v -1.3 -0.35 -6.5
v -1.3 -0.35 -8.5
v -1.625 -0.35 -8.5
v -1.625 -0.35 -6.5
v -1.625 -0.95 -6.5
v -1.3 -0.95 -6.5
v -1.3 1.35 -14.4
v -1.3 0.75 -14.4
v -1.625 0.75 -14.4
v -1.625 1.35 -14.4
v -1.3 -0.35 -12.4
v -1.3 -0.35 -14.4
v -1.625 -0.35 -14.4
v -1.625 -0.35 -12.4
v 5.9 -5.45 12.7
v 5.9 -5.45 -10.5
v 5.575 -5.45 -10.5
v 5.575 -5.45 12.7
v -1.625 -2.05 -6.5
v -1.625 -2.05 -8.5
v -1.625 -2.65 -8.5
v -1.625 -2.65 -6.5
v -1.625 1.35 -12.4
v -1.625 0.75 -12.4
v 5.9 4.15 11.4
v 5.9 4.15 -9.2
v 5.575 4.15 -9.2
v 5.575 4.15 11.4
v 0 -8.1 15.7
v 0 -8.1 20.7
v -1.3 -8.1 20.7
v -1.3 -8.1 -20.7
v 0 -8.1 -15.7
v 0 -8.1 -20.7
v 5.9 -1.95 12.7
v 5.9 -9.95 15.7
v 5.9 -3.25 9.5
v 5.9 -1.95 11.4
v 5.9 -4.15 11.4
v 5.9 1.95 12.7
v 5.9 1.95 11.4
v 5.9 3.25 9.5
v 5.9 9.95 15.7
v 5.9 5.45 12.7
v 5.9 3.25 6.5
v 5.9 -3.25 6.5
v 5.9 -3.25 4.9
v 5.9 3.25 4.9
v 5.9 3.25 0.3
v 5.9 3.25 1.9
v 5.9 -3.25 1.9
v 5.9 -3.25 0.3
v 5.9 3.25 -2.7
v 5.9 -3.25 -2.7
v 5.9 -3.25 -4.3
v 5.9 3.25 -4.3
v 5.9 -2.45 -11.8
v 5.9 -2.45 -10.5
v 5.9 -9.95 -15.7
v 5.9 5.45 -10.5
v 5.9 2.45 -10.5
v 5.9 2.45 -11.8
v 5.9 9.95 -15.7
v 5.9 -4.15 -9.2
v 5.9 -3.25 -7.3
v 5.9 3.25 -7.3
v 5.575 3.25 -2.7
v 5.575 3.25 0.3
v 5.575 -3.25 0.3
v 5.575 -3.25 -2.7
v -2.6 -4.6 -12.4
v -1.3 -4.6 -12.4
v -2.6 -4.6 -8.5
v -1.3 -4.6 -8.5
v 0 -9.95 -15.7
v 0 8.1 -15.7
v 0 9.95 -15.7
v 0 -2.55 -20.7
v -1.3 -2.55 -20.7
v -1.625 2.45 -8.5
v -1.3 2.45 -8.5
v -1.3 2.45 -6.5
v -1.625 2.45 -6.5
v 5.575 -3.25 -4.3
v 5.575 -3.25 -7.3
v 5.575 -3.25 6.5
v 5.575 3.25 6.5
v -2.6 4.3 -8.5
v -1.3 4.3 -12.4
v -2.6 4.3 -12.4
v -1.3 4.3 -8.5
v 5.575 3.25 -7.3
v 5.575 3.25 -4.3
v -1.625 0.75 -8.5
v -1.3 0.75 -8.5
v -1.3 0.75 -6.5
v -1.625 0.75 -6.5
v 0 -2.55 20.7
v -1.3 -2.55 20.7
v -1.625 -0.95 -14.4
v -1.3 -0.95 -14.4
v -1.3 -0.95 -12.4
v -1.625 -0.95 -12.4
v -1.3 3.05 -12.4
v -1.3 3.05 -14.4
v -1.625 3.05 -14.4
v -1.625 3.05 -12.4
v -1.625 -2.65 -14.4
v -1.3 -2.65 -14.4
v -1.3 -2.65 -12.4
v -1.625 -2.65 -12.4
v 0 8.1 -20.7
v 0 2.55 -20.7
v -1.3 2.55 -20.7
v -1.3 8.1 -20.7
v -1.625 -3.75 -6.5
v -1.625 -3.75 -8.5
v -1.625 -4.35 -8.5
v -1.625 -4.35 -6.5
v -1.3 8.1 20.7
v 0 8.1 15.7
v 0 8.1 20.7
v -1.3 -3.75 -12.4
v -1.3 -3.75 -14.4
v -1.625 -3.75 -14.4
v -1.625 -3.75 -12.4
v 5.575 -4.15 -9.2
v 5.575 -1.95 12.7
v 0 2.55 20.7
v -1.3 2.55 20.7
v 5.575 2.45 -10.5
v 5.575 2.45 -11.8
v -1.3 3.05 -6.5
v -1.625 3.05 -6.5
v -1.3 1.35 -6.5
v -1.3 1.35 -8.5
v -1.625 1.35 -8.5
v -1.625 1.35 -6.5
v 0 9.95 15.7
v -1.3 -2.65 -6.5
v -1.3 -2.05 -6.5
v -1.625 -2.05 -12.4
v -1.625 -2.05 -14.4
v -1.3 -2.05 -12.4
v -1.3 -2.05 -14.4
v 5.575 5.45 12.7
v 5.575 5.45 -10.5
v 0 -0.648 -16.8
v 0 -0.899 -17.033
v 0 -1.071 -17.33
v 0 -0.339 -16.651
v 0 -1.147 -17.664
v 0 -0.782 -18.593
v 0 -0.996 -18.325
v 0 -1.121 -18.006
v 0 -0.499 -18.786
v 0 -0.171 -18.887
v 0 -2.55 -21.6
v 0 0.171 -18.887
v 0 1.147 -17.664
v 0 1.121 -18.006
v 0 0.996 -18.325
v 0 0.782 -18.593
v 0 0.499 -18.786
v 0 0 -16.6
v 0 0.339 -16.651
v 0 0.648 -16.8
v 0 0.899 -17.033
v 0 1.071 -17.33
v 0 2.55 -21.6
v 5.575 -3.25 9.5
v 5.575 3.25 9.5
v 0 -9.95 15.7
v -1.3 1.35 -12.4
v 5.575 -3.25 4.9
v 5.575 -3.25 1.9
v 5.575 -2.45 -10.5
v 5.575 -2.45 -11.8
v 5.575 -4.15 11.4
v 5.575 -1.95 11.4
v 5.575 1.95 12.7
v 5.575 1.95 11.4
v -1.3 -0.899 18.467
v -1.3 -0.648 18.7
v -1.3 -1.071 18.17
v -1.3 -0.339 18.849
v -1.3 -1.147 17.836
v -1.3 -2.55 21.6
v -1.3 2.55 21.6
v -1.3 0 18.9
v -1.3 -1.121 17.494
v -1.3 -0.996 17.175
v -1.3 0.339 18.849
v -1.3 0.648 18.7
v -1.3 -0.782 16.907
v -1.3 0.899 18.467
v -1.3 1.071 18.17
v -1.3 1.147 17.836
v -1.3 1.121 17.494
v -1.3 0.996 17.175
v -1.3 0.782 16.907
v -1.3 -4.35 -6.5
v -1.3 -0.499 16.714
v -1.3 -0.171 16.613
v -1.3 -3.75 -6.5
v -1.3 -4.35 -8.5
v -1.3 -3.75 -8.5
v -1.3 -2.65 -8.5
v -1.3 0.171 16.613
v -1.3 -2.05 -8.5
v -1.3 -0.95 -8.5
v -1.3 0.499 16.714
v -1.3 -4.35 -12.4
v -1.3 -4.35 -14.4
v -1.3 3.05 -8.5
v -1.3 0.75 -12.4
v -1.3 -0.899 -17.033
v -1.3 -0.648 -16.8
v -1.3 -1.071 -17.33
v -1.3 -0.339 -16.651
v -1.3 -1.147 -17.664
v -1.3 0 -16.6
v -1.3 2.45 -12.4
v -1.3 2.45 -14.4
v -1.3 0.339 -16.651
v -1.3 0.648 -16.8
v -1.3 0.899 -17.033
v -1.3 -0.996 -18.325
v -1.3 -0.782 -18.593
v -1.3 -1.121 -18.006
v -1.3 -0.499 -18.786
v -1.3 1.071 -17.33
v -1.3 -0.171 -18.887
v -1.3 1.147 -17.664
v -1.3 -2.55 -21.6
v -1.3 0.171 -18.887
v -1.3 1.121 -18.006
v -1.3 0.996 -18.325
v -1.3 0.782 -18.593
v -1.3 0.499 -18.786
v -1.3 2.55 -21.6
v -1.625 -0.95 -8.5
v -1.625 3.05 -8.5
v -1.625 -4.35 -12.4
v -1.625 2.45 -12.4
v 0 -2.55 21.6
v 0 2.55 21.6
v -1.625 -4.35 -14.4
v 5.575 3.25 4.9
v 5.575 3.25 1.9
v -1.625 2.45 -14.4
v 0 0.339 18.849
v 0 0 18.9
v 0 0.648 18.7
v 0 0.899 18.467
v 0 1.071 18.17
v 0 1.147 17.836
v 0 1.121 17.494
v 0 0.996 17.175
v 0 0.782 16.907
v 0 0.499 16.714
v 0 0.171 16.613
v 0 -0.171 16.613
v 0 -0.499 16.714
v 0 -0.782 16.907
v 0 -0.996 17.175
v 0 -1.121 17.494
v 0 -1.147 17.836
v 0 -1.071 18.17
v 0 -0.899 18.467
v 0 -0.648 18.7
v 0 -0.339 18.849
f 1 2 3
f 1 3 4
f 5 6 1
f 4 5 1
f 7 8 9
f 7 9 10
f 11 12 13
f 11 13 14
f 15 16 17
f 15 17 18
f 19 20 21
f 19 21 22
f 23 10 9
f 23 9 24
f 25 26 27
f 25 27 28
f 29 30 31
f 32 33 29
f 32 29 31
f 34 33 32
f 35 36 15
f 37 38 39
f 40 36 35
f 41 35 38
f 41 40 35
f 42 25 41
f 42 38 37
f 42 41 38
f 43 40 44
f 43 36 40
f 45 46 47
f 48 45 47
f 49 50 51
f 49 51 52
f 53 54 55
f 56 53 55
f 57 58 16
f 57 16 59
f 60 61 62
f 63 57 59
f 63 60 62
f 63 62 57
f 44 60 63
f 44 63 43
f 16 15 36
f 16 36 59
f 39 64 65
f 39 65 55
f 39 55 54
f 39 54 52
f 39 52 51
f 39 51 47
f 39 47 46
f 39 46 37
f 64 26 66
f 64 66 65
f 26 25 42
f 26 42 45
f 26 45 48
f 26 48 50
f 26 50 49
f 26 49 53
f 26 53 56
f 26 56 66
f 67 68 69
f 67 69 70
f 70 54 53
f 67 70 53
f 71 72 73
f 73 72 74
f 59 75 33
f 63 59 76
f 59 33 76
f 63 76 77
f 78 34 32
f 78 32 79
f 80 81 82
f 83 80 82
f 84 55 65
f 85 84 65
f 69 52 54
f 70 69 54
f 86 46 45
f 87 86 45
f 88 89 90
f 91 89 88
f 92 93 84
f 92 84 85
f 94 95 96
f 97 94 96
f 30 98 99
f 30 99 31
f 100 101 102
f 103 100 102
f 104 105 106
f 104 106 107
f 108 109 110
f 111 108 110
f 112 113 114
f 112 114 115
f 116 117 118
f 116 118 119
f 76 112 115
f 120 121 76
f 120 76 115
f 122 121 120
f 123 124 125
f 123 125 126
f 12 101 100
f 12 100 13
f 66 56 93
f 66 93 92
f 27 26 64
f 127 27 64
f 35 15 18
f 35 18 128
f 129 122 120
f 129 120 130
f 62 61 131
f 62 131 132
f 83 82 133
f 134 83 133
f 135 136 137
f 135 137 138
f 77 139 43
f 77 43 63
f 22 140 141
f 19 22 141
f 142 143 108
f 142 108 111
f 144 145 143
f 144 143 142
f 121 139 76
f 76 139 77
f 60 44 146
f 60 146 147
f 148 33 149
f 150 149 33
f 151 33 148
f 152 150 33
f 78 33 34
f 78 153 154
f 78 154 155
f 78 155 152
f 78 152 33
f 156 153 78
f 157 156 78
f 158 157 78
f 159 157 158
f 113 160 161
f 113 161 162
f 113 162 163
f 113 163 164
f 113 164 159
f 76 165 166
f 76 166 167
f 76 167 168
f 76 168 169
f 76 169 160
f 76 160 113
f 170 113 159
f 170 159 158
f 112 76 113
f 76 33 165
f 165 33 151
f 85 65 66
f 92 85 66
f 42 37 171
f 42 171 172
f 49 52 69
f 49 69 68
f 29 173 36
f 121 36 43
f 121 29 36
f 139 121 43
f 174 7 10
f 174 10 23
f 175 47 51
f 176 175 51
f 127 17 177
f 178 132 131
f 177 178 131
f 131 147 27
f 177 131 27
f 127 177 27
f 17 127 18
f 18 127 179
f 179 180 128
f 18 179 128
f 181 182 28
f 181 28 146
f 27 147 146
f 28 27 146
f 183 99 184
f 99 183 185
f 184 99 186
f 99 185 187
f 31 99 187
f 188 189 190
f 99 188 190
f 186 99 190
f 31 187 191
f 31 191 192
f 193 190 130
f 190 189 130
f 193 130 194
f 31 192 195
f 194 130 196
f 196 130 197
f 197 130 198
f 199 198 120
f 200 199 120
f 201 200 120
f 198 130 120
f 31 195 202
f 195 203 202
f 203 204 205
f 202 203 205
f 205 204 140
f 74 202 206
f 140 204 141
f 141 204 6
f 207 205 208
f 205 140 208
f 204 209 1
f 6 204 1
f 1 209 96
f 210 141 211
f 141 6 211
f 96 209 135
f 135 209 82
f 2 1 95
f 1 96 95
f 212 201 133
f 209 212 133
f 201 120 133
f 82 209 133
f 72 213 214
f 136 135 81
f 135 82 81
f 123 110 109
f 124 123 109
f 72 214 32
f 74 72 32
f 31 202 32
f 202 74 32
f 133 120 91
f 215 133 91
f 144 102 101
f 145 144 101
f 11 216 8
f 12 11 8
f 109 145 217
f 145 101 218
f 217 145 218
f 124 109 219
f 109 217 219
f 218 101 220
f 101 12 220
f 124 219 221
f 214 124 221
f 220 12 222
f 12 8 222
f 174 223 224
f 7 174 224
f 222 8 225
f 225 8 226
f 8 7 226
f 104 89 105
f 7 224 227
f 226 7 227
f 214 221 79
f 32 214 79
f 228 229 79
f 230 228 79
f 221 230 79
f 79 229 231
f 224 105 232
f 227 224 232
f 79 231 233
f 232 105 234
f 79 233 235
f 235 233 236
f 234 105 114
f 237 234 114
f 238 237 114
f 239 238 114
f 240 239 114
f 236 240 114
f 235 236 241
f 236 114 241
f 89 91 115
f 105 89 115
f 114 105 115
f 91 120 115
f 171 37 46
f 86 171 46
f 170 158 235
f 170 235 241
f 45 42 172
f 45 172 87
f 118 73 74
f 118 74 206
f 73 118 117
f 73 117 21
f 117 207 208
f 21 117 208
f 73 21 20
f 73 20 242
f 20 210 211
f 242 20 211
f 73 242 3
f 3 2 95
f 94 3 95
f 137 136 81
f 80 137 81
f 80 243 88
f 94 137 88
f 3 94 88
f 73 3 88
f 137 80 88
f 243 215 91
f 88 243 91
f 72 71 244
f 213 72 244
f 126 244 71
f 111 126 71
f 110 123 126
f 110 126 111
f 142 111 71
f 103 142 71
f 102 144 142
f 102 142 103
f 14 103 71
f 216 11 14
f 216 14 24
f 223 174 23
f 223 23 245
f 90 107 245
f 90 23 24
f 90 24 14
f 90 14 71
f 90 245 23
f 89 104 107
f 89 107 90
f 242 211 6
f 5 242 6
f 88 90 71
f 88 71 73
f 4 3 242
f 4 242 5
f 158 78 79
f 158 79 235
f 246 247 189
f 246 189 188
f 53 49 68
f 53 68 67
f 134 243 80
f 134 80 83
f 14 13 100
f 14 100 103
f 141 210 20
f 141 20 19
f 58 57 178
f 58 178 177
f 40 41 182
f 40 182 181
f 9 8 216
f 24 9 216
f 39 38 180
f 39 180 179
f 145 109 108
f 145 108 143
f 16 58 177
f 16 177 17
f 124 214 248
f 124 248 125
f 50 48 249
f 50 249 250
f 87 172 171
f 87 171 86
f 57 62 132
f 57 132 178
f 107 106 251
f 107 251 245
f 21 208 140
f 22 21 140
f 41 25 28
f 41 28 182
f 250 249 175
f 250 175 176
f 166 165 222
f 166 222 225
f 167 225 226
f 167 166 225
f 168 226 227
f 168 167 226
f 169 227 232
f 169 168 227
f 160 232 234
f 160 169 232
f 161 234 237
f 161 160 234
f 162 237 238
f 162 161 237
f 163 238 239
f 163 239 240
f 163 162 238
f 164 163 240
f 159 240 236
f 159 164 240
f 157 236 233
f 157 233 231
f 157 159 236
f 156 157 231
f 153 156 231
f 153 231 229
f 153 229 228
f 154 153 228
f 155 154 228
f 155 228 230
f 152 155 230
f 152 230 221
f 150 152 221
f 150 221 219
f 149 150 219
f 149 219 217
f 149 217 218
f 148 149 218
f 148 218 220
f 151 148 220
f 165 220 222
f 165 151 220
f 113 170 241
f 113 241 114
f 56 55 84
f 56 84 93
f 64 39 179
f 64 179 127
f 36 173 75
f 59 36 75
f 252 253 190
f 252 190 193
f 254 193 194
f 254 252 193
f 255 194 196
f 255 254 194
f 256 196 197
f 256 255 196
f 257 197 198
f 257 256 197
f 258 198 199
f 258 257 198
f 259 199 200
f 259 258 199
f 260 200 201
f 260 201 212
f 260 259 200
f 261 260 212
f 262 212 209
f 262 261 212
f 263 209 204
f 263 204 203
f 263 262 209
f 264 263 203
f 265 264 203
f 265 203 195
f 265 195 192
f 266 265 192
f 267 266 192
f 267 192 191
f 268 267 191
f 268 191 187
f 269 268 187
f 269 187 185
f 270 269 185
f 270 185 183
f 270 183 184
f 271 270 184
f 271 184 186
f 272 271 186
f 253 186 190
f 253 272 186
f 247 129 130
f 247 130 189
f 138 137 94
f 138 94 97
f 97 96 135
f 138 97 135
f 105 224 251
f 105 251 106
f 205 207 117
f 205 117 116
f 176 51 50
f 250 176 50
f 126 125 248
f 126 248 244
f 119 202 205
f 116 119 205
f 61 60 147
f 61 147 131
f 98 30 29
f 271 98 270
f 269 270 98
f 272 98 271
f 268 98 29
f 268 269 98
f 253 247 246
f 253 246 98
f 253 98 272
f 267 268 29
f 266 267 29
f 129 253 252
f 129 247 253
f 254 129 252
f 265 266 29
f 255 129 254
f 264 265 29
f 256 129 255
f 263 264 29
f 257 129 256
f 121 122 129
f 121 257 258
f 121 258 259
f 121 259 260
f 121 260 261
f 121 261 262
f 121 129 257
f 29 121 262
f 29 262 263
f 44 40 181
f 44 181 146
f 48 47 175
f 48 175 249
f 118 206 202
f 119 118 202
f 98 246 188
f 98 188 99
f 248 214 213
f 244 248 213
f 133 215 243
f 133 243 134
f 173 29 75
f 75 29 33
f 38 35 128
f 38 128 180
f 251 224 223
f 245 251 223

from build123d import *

# Parameters (mm, degrees)
CROQUIS1_W              = 31.4
CROQUIS1_H              = 19.9
SALIENTE_EXTRUIR1_DEPTH = 5.9
CROQUIS2_R              = 1.15
SALIENTE_EXTRUIR2_DEPTH = 1.3
CROQUIS3_W              = 3.9
CROQUIS3_H              = 8.9
SALIENTE_EXTRUIR3_DEPTH = 1.3
CROQUIS4_W              = 2
CROQUIS4_H              = 0.6
SALIENTE_EXTRUIR4_DEPTH = 0.325
MATRIZL1_COUNT          = 2
MATRIZL1_PITCH          = 5.9
MATRIZL1_COUNT_DIR2     = 5
MATRIZL1_PITCH_DIR2     = 1.7
CROQUIS5_W              = 3
CROQUIS5_H              = 6.5
CORTAR_EXTRUIR1_DEPTH   = 0.325


with BuildPart() as part:
    # Croquis1 → Saliente-Extruir1 (new body)
    with BuildSketch(Plane(origin=(0, 0, 0), x_dir=(0, 0, -1), z_dir=(1, 0, 0))):
        Rectangle(CROQUIS1_W, CROQUIS1_H)
    extrude(amount=SALIENTE_EXTRUIR1_DEPTH)

    # Croquis2 → Saliente-Extruir2 (add)
    with BuildSketch(Plane.ZY):
        Polygon((21.6, 2.55), (21.6, -2.55), (20.7, -2.55), (20.7, -8.1), (-20.7, -8.1), (-20.7, -2.55), (-21.6, -2.55), (-21.6, 2.55), (-20.7, 2.55), (-20.7, 8.1), (20.7, 8.1), (20.7, 2.55), align=None)
        with Locations((-17.75, 0)):
            Circle(CROQUIS2_R, mode=Mode.SUBTRACT)
        with Locations((17.75, 0)):
            Circle(CROQUIS2_R, mode=Mode.SUBTRACT)
    extrude(amount=SALIENTE_EXTRUIR2_DEPTH)

    # Croquis3 → Saliente-Extruir3 (add)
    with BuildSketch(Plane.ZY.offset(1.3)):
        with Locations((-10.45, -0.15)):
            Rectangle(CROQUIS3_W, CROQUIS3_H)
    extrude(amount=SALIENTE_EXTRUIR3_DEPTH)

    # Croquis4 → Saliente-Extruir4 (add)
    with BuildSketch(Plane.ZY.offset(1.3)):
        with Locations((-7.5, -4.05)):
            Rectangle(CROQUIS4_W, CROQUIS4_H)
    saliente_extruir4 = extrude(amount=SALIENTE_EXTRUIR4_DEPTH)

    # MatrizL1: Saliente-Extruir4 2 × 5
    with Locations(*[(0, j * MATRIZL1_PITCH_DIR2, -i * MATRIZL1_PITCH) for i in range(MATRIZL1_COUNT) for j in range(MATRIZL1_COUNT_DIR2) if (i, j) != (0, 0)]):
        add(saliente_extruir4)

    # Croquis5 → Cortar-Extruir1 (cut)
    with BuildSketch(Plane(origin=(5.9, 0, 0), x_dir=(0, 0, -1), z_dir=(1, 0, 0))):
        Polygon((-12.7, 1.95), (-12.7, 5.45), (10.5, 5.45), (10.5, 2.45), (11.8, 2.45), (11.8, -2.45), (10.5, -2.45), (10.5, -5.45), (-12.7, -5.45), (-12.7, -1.95), (-11.4, -1.95), (-11.4, -4.15), (9.2, -4.15), (9.2, -1.15), (9.2, 1.15), (9.2, 4.15), (-11.4, 4.15), (-11.4, 1.95), align=None)
        with Locations((1.2, 0)):
            Rectangle(CROQUIS5_W, CROQUIS5_H)
        with Locations((5.8, 0)):
            Rectangle(CROQUIS5_W, CROQUIS5_H)
        with Locations((-3.4, 0)):
            Rectangle(CROQUIS5_W, CROQUIS5_H)
        with Locations((-8, 0)):
            Rectangle(CROQUIS5_W, CROQUIS5_H)
    extrude(amount=-CORTAR_EXTRUIR1_DEPTH, mode=Mode.SUBTRACT)


solid = part.part
